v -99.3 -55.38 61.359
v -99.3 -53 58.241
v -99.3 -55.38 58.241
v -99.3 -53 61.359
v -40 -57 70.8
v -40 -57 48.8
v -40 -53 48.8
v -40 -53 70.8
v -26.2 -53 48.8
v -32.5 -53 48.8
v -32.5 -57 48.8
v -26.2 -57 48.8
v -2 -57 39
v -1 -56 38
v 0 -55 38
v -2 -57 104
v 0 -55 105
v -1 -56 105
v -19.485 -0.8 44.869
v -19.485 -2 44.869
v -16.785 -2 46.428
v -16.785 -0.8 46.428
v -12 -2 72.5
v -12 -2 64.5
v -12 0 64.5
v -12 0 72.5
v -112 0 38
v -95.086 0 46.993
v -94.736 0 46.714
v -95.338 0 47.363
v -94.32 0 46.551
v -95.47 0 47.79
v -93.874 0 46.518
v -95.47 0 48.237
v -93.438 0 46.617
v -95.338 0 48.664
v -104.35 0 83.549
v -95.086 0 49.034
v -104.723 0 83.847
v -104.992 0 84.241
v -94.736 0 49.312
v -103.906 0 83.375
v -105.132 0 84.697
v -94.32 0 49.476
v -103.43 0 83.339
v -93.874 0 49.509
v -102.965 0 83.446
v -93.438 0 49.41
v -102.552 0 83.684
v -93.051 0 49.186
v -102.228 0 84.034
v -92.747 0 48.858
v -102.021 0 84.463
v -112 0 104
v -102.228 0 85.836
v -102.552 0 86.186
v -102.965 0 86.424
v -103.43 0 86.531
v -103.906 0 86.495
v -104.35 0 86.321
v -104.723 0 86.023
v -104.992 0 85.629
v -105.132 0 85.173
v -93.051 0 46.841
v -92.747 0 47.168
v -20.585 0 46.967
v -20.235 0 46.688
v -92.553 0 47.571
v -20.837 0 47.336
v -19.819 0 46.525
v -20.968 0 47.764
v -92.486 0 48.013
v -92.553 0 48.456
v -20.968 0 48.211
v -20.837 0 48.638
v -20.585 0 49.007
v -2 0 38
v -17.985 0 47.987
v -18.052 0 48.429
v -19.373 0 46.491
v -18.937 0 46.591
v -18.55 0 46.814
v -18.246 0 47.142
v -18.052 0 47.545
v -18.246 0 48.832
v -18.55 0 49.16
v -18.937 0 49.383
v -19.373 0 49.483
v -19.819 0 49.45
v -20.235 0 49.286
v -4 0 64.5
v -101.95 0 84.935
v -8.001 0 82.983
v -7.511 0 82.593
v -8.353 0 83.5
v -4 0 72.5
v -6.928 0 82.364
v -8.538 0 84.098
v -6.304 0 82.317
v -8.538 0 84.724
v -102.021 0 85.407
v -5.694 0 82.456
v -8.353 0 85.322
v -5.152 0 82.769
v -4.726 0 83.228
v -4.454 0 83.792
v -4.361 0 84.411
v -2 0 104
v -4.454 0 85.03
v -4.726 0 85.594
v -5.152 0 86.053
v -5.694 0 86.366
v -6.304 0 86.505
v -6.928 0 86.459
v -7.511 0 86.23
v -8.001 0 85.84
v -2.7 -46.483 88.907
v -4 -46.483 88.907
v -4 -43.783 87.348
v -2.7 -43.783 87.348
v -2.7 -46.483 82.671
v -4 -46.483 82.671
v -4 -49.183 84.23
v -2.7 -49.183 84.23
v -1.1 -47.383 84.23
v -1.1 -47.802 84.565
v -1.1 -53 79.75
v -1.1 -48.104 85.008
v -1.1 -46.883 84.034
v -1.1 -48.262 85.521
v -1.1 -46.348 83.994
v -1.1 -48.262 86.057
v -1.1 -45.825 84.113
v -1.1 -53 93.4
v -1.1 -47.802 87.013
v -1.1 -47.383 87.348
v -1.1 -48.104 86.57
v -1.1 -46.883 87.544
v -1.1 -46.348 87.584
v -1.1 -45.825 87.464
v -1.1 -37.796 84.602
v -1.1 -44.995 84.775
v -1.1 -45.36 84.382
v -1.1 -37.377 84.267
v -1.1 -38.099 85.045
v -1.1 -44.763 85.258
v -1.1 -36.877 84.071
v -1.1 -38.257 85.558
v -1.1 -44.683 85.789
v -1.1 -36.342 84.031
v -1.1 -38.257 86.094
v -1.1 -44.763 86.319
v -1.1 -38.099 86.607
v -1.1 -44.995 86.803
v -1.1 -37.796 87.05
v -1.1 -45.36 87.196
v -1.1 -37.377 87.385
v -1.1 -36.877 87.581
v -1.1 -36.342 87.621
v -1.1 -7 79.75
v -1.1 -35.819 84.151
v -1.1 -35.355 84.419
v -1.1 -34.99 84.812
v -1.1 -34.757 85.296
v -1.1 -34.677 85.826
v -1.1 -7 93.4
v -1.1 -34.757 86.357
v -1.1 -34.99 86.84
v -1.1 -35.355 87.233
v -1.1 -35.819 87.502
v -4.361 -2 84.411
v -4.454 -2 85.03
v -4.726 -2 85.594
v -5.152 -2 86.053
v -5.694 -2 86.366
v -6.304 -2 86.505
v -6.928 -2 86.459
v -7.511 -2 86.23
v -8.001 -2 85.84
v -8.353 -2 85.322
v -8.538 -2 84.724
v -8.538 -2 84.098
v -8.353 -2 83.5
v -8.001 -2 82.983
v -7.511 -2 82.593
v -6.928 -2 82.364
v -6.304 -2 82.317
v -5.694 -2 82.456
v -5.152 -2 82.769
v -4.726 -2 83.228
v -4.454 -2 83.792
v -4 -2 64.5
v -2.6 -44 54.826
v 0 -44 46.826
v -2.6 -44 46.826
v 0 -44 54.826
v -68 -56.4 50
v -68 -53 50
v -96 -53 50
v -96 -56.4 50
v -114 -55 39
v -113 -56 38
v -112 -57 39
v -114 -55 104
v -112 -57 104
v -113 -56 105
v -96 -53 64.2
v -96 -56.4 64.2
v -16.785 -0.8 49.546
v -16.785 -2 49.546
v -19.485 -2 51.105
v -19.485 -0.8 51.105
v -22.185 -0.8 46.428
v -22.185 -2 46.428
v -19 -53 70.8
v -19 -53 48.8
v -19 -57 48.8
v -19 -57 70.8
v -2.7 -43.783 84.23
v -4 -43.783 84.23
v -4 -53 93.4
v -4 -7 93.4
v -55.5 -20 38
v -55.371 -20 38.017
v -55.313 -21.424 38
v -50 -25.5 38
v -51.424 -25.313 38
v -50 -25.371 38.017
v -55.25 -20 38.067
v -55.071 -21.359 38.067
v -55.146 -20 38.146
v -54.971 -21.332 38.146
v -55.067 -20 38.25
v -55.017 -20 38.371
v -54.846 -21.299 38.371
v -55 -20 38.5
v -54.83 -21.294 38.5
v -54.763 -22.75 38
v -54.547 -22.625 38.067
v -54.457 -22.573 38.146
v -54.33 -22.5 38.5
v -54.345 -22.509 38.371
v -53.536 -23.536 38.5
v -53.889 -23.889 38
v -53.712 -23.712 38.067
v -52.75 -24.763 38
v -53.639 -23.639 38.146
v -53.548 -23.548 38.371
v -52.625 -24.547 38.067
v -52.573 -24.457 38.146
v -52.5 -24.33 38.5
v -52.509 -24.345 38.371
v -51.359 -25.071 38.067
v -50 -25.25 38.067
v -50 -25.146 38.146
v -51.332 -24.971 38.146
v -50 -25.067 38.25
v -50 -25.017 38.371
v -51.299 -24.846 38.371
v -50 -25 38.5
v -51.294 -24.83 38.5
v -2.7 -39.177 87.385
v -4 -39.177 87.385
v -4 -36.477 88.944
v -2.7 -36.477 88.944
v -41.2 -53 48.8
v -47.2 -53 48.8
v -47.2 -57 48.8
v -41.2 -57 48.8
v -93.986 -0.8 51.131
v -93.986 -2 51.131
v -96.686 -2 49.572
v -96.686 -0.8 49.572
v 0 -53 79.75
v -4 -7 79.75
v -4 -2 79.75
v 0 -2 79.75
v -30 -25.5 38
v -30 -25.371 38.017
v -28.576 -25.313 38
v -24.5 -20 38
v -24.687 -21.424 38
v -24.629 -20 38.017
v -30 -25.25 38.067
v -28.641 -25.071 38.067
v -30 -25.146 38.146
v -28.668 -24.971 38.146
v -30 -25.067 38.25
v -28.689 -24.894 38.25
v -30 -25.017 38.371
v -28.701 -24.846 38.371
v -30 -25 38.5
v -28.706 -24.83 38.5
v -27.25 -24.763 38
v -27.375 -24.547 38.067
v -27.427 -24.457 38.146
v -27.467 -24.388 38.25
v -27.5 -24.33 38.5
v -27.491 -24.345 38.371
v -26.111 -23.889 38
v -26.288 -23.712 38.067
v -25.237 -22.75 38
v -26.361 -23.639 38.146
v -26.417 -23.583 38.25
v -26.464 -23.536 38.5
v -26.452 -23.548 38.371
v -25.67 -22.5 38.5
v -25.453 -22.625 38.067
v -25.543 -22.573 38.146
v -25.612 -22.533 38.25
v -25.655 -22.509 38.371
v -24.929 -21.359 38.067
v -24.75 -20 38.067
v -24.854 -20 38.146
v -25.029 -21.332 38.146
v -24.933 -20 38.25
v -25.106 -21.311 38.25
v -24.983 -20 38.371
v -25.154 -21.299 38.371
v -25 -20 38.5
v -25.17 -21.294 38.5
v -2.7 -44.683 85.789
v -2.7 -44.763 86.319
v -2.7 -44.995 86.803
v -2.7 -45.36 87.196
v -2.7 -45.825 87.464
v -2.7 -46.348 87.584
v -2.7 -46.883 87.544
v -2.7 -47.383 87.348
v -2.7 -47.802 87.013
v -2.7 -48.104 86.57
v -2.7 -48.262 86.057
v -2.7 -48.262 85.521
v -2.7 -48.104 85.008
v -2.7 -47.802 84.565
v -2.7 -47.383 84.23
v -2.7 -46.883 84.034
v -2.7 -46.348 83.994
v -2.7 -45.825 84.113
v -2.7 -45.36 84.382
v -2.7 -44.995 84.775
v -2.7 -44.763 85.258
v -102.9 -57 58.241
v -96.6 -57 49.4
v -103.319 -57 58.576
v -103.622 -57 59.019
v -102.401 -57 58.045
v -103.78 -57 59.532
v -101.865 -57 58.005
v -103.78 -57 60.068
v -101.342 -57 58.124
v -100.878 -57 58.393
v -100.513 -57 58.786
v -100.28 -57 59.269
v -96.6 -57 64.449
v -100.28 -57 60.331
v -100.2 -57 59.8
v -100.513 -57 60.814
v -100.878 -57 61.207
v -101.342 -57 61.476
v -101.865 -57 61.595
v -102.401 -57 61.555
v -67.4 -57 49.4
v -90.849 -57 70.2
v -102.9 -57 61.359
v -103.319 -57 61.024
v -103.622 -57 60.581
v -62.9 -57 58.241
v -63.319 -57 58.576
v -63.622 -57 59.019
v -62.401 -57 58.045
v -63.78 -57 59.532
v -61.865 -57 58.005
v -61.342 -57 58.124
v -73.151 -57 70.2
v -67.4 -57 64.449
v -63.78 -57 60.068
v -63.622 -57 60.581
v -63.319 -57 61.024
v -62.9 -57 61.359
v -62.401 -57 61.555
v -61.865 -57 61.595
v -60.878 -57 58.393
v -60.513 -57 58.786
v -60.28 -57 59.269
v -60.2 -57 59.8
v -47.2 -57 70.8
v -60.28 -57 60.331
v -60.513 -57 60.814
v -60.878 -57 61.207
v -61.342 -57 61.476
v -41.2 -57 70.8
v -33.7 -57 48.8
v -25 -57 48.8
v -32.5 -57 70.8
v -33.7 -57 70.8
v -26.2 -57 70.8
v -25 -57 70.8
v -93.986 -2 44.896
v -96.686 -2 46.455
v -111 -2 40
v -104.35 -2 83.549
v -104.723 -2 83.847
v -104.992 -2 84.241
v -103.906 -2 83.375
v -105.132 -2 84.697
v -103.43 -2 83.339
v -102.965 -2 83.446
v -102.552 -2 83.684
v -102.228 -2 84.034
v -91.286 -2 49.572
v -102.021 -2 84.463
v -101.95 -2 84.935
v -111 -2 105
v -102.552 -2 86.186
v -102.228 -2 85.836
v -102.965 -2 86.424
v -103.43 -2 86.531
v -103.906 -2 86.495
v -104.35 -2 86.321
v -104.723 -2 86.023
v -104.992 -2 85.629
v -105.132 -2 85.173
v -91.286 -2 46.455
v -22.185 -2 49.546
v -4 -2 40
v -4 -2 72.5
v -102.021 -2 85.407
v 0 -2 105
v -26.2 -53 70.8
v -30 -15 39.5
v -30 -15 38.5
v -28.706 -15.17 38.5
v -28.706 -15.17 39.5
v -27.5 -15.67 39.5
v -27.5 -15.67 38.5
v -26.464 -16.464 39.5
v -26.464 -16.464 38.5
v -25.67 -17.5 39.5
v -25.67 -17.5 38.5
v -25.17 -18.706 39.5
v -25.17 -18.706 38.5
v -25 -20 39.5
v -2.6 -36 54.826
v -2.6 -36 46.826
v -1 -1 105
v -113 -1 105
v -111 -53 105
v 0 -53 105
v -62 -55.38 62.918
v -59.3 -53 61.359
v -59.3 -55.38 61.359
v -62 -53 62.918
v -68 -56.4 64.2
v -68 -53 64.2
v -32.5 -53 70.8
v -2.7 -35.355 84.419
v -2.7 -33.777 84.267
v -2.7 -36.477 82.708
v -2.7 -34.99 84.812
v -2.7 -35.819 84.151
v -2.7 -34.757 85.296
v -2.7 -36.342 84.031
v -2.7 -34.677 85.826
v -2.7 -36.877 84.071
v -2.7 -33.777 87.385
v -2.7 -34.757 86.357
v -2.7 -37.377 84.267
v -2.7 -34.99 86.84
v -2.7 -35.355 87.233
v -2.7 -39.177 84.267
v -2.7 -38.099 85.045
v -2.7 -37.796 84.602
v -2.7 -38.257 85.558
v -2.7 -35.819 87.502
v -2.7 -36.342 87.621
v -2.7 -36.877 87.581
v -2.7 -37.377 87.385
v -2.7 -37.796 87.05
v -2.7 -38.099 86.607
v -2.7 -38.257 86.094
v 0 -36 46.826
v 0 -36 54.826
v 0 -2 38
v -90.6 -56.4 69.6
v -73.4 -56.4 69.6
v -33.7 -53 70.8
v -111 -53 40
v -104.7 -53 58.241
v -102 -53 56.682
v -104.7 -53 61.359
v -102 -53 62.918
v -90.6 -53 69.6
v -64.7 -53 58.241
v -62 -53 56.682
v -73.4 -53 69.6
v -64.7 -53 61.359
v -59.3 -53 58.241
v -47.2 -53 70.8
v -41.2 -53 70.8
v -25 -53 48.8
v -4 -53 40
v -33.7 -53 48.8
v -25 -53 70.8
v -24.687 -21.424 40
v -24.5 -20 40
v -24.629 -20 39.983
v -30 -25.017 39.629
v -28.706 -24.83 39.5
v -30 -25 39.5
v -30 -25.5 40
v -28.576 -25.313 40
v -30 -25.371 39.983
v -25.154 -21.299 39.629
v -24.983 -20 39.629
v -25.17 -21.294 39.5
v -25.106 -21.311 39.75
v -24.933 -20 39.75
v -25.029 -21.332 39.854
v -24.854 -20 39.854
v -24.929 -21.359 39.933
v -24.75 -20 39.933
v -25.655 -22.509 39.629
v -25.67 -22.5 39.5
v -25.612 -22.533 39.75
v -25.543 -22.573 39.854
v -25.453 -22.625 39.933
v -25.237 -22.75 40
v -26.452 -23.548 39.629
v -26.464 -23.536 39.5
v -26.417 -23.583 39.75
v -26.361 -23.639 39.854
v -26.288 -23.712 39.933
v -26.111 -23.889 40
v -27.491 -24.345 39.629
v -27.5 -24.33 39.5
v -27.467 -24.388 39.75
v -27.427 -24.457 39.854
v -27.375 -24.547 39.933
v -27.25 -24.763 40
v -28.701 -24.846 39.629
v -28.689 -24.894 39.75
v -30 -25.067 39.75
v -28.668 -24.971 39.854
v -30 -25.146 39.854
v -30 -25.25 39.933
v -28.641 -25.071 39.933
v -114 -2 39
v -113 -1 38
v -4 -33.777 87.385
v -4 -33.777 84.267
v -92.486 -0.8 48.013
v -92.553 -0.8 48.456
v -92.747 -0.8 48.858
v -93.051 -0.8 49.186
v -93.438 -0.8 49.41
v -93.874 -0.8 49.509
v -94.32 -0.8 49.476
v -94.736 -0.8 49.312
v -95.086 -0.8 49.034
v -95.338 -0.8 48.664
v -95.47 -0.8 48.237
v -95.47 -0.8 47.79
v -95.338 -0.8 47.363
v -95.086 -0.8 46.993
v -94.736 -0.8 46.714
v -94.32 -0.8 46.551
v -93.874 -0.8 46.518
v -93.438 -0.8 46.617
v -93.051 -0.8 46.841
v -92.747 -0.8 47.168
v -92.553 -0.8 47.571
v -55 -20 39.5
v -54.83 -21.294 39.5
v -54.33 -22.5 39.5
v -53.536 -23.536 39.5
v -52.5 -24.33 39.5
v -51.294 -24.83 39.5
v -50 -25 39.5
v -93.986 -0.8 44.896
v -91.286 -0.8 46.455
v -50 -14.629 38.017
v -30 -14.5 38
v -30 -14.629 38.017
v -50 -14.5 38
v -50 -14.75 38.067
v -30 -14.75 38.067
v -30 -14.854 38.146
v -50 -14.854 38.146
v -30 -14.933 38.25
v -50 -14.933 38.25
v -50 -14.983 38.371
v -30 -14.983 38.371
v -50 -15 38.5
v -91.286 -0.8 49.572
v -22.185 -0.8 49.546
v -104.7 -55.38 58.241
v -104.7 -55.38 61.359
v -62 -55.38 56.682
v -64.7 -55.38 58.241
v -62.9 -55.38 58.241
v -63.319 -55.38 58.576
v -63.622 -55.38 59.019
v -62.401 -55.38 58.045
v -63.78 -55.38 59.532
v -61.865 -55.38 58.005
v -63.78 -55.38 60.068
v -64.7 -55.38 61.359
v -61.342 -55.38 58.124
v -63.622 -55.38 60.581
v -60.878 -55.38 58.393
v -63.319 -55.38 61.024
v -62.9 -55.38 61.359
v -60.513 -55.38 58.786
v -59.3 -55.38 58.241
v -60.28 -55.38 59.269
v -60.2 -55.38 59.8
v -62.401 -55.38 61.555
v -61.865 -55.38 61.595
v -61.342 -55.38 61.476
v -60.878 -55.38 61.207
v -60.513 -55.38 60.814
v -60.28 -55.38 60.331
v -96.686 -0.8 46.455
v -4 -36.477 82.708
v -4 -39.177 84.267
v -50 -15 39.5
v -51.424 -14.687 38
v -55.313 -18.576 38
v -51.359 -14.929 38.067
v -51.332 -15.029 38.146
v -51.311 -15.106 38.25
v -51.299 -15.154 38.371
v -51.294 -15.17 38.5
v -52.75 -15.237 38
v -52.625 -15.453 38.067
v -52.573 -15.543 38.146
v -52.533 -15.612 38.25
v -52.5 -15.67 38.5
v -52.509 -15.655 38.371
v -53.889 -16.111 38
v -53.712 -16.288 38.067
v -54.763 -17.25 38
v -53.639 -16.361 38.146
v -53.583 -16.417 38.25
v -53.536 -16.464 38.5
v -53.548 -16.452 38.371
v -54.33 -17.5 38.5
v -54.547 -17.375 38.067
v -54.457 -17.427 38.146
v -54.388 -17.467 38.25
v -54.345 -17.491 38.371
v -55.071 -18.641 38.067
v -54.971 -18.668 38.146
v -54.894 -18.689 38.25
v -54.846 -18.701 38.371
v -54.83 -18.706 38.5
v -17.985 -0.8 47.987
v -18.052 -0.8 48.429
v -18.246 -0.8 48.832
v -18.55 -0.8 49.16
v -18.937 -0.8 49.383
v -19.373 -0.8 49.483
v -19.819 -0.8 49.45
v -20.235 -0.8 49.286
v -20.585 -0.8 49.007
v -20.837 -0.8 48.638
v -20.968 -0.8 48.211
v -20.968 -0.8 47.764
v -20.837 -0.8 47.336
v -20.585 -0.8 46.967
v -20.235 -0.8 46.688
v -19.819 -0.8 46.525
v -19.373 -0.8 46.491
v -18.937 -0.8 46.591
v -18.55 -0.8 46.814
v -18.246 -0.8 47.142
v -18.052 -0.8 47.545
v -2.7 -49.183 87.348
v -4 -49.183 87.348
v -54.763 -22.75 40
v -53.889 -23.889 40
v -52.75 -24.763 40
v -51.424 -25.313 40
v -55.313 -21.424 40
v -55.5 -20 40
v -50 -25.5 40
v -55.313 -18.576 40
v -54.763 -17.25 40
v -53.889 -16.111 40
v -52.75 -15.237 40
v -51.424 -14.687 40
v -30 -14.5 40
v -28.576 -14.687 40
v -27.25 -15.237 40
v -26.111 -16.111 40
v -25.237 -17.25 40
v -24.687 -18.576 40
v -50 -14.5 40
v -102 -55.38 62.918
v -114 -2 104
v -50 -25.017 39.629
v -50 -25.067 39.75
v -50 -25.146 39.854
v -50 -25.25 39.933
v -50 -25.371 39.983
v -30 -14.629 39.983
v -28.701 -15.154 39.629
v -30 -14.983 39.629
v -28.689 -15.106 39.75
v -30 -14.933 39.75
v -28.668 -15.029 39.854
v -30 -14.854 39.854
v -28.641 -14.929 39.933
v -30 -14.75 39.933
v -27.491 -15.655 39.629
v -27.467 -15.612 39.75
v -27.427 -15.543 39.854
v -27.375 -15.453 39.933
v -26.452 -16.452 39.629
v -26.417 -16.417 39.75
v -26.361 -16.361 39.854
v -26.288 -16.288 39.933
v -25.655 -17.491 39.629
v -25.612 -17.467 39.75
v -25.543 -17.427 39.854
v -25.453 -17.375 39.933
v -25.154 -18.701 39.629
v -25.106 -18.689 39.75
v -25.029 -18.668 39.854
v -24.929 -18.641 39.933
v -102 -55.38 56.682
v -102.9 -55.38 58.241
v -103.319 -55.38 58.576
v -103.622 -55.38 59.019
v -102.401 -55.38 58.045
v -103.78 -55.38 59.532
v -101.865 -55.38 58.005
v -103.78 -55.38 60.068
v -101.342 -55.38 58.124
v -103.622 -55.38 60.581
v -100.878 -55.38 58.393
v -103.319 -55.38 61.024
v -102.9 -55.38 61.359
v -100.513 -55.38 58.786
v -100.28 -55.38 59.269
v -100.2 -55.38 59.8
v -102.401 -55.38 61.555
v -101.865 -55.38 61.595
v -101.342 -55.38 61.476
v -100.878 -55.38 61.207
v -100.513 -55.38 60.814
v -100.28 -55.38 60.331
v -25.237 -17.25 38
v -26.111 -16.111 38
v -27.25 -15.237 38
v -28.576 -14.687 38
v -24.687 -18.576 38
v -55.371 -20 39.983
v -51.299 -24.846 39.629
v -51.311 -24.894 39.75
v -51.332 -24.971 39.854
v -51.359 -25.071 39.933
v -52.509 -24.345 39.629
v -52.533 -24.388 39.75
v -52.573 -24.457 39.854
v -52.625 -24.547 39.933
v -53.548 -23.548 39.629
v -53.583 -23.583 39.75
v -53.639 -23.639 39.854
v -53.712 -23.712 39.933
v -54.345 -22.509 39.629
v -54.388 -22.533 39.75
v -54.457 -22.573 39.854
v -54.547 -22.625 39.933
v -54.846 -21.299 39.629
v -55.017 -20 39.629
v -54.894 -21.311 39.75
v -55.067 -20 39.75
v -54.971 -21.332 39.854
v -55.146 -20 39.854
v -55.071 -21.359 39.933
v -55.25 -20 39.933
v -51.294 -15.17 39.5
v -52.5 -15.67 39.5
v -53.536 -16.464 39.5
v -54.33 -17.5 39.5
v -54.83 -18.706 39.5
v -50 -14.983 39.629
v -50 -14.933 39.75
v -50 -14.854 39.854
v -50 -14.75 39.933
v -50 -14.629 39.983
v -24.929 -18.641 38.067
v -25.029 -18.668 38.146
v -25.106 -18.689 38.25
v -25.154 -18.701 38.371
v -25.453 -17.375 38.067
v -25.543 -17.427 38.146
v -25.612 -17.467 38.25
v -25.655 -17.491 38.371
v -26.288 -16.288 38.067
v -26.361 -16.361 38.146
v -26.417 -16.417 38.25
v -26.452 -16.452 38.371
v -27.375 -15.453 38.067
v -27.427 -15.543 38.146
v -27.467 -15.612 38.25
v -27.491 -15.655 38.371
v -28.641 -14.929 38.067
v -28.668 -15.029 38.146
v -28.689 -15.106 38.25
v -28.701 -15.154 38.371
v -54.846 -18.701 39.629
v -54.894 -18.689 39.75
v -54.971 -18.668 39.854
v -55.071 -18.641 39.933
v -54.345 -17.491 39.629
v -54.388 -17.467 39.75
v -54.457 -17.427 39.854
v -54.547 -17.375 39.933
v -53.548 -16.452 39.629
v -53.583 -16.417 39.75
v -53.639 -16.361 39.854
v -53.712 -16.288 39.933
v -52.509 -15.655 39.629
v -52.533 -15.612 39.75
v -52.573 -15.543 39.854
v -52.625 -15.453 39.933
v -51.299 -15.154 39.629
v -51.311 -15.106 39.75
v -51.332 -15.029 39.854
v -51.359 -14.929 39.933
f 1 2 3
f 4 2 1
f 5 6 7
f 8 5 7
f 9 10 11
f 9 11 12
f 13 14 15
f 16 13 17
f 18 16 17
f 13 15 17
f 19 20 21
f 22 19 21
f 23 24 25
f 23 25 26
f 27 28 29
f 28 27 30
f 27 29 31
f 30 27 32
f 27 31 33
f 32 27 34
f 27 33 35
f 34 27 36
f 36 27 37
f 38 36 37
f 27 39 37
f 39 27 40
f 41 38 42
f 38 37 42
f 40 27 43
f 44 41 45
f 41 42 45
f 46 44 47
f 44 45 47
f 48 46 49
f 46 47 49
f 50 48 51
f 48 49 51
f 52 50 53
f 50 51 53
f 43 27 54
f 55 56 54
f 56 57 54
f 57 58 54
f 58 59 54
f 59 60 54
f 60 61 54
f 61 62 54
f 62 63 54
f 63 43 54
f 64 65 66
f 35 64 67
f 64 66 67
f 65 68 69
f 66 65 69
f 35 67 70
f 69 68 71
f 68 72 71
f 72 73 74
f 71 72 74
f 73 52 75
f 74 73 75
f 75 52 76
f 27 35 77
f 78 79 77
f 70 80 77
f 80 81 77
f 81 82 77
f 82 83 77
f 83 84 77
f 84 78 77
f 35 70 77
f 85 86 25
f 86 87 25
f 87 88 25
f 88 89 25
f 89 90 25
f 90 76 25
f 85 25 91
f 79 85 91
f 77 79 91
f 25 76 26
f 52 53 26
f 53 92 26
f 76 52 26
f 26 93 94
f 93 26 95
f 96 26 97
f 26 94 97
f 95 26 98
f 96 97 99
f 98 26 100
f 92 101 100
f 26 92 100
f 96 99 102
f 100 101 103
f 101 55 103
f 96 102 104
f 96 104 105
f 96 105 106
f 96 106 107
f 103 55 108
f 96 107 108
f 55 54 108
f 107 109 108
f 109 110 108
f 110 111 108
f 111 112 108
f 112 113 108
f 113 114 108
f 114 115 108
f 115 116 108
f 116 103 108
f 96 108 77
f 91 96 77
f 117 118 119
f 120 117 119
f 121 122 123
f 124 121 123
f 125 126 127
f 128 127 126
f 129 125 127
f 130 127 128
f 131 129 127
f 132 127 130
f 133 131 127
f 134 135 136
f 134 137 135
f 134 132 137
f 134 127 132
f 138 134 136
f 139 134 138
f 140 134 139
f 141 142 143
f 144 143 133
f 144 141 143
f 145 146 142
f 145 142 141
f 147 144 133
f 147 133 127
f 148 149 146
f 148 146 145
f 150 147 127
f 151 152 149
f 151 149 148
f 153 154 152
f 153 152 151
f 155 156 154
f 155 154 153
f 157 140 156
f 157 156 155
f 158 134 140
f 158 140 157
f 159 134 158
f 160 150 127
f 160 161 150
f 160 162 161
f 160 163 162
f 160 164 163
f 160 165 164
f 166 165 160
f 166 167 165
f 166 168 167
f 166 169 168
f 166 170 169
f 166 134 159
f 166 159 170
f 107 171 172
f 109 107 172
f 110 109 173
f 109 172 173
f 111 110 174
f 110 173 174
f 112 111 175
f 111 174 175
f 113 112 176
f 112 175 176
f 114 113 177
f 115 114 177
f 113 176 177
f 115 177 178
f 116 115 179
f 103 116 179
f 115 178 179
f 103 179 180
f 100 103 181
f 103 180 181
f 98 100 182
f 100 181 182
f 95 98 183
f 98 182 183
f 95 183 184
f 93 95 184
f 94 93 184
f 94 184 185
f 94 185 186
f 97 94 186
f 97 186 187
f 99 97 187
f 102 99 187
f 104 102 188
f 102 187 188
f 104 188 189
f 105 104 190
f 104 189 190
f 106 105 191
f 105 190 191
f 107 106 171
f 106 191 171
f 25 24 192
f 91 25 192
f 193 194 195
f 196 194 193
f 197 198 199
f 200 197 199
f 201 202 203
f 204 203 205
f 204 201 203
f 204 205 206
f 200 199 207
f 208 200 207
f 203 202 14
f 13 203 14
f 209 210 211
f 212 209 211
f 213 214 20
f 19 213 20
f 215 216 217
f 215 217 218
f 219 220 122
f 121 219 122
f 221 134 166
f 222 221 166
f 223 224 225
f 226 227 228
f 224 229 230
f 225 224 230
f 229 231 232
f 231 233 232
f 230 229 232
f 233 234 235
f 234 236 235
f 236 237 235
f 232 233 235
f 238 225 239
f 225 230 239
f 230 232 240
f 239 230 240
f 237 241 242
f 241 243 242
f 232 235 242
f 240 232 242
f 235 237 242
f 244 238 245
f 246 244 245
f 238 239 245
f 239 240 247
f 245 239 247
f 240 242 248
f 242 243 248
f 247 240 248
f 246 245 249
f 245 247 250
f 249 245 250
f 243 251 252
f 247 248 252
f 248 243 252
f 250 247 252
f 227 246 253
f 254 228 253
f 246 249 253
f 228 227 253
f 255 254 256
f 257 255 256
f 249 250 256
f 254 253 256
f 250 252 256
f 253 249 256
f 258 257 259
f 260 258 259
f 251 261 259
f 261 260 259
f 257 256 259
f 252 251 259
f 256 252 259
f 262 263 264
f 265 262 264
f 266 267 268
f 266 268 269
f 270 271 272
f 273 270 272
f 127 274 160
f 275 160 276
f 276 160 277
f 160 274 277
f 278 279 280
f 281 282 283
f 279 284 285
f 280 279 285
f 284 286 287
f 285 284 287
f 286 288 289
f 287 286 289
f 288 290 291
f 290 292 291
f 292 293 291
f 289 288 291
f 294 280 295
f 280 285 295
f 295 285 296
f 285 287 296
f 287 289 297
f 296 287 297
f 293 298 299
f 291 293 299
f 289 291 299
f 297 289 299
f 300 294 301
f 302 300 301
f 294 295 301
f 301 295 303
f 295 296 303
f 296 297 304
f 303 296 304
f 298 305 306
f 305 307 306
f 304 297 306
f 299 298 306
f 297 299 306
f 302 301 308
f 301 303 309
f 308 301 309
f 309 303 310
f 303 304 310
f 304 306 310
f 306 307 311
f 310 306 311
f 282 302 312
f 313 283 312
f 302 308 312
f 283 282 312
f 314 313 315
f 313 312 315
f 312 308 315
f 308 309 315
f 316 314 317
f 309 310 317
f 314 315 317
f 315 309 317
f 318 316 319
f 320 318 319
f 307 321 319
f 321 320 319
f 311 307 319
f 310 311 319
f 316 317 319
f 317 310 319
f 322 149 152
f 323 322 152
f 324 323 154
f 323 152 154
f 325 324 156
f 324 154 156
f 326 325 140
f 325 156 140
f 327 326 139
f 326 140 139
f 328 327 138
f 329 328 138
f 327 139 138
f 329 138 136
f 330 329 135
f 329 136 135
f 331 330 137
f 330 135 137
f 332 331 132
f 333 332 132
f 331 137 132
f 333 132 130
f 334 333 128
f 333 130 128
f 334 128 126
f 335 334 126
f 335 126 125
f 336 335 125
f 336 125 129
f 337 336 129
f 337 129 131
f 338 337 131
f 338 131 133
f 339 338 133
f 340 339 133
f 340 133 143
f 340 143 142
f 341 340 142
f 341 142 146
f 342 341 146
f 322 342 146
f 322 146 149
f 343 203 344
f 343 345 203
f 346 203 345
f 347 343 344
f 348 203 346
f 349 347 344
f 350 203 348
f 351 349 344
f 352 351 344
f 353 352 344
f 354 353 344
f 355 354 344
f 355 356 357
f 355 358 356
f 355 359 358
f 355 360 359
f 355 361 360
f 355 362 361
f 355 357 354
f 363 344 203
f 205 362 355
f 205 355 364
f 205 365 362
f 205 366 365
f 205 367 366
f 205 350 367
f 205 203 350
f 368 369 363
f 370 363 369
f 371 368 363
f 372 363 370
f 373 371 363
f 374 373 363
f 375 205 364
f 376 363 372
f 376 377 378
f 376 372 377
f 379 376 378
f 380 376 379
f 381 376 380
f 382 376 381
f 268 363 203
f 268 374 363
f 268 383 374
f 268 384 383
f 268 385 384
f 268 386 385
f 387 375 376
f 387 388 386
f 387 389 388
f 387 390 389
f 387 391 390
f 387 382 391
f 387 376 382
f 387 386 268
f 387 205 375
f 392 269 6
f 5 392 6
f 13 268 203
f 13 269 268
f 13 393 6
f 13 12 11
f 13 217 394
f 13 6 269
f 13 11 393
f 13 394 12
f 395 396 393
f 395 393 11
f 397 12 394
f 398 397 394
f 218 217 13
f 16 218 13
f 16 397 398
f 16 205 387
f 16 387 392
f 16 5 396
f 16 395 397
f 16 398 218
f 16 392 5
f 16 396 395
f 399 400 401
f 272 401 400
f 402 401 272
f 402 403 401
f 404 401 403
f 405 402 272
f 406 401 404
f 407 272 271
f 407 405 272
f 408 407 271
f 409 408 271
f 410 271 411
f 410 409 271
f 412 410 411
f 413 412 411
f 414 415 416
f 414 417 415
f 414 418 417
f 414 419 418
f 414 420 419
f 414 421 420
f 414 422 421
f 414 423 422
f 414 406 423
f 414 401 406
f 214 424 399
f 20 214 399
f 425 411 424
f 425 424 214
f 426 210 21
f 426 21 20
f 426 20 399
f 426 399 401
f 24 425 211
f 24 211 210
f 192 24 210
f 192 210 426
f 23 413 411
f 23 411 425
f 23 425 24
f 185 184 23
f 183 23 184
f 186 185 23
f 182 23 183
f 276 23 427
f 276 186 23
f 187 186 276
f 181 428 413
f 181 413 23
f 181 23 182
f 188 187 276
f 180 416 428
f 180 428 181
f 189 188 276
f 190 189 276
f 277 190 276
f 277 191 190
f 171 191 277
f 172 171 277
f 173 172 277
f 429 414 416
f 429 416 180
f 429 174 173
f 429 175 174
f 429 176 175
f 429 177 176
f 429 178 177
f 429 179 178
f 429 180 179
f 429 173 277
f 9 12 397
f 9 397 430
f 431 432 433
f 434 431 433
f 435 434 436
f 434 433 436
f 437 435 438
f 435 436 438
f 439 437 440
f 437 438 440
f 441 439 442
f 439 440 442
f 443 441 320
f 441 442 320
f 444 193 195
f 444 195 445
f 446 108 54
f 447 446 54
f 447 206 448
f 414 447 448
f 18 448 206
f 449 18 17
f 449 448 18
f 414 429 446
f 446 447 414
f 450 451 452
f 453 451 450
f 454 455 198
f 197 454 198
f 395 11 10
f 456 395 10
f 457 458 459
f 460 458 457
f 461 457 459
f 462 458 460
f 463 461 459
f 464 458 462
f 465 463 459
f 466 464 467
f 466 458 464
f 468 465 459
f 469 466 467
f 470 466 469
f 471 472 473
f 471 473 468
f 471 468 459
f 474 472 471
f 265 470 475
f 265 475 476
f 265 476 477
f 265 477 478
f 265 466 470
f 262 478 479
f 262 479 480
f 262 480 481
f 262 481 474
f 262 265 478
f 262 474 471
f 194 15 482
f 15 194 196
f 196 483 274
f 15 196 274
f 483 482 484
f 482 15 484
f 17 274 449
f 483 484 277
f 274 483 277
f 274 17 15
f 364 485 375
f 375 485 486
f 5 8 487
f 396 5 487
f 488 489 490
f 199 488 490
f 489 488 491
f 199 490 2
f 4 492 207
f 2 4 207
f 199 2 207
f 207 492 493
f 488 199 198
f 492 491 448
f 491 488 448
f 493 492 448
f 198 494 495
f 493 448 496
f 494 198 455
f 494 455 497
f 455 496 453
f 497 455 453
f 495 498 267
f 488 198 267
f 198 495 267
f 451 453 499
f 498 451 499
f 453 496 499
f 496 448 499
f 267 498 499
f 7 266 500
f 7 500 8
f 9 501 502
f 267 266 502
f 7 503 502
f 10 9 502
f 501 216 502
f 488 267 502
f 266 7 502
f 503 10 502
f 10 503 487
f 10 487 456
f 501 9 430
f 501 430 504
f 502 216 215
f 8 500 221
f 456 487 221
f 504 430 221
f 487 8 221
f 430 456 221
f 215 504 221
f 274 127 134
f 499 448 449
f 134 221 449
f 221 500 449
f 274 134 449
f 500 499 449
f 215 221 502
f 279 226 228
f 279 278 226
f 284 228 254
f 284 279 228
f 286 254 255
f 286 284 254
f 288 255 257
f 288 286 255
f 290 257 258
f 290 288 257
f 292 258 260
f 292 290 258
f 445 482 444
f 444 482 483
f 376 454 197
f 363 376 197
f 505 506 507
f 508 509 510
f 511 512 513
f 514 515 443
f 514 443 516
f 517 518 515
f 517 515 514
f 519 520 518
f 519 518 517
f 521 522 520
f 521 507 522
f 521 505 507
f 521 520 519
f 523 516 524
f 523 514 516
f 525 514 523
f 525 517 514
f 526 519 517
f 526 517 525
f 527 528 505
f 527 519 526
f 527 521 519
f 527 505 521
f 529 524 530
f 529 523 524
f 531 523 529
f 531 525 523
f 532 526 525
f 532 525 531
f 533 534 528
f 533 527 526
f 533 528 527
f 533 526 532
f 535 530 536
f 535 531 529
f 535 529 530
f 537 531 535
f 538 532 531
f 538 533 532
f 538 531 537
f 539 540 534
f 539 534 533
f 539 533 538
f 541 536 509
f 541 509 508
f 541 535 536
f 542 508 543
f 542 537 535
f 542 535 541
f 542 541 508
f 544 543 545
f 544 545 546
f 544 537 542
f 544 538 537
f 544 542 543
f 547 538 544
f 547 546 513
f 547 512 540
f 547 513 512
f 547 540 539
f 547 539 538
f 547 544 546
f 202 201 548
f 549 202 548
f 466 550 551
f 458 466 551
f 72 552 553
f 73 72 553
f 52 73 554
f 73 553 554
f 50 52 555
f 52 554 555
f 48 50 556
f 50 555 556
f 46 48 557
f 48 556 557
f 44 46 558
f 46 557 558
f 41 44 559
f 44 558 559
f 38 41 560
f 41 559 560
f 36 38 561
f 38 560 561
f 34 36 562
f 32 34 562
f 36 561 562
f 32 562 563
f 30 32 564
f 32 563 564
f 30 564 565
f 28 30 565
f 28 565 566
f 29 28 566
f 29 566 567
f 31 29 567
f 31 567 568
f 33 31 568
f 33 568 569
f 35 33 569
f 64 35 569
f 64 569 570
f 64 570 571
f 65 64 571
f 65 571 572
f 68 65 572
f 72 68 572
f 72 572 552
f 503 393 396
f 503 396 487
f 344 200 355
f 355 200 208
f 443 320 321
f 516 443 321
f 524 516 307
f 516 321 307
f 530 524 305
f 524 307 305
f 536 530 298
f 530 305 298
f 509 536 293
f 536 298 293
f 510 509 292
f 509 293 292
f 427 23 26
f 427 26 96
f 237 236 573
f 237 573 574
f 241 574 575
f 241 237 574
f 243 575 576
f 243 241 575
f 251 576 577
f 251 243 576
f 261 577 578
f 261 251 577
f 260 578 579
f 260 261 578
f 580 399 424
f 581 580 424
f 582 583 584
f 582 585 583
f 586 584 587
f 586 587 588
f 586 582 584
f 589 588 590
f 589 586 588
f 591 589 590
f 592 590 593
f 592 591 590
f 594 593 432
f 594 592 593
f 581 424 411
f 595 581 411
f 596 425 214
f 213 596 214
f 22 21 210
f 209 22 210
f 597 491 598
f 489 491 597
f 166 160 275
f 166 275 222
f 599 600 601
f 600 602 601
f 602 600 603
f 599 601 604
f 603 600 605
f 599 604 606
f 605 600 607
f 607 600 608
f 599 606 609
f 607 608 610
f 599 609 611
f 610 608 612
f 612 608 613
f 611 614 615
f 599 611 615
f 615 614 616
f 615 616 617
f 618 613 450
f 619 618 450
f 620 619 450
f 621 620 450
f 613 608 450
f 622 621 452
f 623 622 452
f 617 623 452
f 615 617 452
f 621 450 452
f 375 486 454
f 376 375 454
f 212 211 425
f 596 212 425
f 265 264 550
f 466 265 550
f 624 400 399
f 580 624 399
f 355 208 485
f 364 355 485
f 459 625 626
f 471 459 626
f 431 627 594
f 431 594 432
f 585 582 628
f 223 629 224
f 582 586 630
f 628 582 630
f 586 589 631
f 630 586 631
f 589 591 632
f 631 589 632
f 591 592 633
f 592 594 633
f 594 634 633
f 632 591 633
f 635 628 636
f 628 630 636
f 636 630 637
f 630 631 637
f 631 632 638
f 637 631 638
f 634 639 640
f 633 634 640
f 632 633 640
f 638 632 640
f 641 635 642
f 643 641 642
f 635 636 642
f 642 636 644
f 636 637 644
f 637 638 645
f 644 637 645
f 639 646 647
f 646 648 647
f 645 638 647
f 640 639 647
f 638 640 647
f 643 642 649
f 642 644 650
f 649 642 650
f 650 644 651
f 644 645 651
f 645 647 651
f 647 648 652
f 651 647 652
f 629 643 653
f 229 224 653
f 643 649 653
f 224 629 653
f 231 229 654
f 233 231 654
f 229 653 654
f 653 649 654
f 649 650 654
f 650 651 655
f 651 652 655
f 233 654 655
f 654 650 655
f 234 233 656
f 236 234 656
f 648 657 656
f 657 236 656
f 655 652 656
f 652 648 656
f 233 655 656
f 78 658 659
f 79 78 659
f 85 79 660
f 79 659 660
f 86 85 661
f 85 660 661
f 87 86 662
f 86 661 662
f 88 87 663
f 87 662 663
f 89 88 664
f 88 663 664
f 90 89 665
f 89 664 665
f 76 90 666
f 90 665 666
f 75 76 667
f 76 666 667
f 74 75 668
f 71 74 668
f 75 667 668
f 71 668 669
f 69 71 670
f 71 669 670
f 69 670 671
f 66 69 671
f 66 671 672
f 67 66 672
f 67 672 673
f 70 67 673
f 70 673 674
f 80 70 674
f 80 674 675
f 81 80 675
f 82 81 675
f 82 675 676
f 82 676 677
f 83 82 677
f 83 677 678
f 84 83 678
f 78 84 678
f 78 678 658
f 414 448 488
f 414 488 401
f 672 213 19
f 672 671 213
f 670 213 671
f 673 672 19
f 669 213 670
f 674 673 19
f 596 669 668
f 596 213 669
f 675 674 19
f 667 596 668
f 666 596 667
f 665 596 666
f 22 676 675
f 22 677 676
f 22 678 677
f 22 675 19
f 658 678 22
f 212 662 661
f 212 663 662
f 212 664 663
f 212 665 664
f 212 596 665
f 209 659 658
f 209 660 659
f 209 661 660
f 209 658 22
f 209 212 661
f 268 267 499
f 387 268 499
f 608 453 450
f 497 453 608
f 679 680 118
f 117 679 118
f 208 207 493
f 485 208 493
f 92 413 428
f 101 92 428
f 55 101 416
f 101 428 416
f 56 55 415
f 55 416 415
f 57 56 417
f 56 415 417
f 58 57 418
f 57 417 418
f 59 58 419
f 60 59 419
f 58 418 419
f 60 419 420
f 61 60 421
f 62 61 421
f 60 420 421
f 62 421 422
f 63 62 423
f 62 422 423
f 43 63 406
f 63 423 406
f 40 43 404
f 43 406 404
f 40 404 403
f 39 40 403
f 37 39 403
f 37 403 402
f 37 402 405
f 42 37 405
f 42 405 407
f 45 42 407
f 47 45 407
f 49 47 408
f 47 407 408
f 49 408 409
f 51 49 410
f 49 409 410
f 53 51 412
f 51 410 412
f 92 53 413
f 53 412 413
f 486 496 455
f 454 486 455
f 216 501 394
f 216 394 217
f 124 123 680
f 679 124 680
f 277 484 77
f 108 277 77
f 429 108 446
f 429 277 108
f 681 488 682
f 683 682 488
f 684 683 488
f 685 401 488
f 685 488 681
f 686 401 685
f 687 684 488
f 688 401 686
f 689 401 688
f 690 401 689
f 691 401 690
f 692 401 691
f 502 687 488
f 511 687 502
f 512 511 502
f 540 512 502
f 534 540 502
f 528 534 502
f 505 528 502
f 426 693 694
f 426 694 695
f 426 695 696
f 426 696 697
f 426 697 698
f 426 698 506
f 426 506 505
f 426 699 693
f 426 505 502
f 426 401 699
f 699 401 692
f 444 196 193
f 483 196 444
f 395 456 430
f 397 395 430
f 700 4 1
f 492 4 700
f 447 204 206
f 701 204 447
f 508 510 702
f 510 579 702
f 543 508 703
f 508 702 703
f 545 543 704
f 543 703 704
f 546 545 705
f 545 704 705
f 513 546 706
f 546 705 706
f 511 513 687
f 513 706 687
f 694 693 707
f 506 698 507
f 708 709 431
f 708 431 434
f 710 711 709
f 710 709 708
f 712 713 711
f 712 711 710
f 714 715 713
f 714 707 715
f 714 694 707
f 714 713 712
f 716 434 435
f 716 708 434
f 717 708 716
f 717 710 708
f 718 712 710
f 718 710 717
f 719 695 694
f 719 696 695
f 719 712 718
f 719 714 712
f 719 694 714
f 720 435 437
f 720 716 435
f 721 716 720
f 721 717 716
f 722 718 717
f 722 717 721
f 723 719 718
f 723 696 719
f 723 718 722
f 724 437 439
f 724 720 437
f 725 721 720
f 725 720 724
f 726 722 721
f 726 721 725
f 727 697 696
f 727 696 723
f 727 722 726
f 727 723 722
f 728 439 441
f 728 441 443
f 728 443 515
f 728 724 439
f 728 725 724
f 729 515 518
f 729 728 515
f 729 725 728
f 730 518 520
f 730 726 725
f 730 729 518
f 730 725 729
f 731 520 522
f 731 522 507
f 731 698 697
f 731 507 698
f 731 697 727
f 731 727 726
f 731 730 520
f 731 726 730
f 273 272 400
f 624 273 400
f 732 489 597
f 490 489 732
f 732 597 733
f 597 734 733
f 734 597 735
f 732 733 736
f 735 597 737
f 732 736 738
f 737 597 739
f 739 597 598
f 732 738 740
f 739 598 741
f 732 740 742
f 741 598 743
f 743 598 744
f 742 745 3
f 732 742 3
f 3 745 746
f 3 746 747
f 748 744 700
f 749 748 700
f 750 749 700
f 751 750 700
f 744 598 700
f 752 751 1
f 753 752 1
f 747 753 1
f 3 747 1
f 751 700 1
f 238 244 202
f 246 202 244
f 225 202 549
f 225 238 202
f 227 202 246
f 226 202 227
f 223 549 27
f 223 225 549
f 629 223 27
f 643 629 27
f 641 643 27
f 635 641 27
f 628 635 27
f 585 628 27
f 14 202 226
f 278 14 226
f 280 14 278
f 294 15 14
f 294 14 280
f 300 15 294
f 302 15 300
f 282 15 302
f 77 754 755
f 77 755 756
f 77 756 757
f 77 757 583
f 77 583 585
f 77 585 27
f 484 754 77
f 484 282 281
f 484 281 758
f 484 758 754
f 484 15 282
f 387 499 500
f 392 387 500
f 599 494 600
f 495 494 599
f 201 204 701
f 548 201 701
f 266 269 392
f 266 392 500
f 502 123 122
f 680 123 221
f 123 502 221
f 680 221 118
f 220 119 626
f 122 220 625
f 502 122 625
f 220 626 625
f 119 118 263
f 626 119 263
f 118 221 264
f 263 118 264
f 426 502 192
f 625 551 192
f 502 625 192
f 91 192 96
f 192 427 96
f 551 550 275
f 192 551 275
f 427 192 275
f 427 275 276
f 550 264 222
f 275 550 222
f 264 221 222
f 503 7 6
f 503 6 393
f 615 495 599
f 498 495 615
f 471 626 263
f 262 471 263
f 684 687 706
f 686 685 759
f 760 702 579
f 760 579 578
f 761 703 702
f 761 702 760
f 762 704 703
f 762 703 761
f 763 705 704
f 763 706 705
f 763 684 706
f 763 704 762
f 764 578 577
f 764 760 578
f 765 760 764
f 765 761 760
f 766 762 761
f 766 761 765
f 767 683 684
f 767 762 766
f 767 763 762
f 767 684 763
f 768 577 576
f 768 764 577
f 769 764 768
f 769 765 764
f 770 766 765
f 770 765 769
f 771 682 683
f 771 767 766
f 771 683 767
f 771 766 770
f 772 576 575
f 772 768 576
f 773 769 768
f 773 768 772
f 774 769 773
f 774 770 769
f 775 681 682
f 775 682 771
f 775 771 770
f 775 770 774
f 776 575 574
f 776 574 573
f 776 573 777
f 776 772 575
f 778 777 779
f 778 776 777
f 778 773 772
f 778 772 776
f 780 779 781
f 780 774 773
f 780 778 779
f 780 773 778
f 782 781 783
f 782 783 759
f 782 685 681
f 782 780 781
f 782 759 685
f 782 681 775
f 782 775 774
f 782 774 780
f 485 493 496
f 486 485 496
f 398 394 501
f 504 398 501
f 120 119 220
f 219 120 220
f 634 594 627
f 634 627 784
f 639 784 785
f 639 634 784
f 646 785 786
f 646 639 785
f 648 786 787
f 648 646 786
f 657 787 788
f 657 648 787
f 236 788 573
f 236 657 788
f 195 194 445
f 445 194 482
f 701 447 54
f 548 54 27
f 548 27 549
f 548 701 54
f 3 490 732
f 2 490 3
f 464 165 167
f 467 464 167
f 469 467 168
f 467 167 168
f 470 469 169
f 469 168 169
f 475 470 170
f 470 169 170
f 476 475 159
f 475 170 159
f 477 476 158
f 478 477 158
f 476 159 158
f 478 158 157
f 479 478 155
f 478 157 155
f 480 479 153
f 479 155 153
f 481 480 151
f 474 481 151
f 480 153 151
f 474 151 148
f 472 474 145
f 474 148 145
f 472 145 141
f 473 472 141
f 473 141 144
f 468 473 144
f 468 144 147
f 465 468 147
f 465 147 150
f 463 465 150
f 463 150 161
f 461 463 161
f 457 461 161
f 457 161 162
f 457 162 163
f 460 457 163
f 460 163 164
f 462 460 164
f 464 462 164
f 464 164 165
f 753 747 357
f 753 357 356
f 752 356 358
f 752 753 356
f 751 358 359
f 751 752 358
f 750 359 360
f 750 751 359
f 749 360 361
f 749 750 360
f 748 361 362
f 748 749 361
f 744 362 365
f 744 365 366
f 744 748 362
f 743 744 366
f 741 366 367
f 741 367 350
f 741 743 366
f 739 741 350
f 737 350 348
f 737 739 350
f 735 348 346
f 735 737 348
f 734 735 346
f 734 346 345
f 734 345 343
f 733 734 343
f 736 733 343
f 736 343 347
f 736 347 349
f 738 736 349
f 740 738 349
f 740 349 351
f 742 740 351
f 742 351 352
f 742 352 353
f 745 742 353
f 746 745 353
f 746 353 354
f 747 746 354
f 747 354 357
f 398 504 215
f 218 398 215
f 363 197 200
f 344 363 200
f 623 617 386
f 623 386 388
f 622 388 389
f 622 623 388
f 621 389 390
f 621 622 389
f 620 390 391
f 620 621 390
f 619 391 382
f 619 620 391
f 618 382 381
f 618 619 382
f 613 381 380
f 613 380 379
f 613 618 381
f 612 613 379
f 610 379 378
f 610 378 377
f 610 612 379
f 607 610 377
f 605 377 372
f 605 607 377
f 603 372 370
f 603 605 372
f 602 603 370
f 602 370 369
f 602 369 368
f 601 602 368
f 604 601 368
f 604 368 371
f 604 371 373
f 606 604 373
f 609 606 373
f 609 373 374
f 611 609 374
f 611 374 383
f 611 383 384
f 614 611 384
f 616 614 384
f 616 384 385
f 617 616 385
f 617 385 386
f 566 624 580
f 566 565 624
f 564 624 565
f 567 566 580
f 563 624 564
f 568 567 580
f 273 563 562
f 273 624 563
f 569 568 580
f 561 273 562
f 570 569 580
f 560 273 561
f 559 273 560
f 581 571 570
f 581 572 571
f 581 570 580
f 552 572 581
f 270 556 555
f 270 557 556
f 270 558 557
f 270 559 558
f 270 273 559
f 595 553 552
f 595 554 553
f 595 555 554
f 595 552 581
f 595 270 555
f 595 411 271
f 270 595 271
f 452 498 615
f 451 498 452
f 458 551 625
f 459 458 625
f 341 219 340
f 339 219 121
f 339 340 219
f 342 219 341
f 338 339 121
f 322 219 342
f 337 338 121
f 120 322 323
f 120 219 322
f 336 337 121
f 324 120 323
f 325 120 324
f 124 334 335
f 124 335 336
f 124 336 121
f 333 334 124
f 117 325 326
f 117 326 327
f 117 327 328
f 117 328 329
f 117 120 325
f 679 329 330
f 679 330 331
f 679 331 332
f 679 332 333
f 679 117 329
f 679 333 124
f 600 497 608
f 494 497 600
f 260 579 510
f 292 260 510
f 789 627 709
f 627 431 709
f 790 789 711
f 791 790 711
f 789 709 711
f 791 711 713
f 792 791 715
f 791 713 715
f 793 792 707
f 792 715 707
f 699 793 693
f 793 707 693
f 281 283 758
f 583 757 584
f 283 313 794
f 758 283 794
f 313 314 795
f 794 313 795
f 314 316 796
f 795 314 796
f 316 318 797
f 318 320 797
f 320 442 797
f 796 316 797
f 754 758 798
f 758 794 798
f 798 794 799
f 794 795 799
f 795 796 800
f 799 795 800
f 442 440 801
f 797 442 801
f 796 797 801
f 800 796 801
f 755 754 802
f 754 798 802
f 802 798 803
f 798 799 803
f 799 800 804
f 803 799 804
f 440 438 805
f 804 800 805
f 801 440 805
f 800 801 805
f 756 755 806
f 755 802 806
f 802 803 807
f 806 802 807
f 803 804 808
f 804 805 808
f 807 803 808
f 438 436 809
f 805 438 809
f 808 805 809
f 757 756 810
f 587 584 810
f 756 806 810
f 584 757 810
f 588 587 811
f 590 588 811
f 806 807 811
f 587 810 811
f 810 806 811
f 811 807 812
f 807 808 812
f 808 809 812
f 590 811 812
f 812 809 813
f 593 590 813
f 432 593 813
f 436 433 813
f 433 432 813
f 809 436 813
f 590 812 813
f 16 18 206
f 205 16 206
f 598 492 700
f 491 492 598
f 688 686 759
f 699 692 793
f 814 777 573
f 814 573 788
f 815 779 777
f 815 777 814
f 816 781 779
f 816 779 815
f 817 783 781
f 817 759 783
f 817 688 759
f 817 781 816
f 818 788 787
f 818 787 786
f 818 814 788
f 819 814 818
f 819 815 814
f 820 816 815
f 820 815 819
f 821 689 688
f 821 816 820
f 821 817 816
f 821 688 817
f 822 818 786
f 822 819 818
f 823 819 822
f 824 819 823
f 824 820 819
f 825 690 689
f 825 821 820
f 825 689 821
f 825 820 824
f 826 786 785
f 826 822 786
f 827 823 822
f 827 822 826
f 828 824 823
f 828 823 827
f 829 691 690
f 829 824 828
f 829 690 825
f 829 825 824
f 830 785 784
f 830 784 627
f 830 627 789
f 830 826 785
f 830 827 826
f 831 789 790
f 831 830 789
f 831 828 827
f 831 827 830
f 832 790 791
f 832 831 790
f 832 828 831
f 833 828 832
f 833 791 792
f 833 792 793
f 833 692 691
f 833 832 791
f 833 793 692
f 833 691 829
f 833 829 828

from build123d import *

# Parameters (mm, degrees)
F7_W      = 57
F7_H      = 65
F8_DEPTH  = 3
F6_W      = 114
F6_H      = 57
F6_W_2    = 30
F6_H_2    = 10
F9_DEPTH  = 2
F10_R     = 4.99999
F5_W      = 57
F5_H      = 53.4
F5_R      = 1.8
F11_DEPTH = 4
F12_W     = 51
F12_H     = 25.25
F13_DEPTH = 1.1
F14_DEPTH = 4
F15_W     = 5
F15_H     = 25.25
F16_DEPTH = 4.1
F1_W      = 111
F1_H      = 65
F1_R      = 1.5
F1_W_2    = 8
F1_H_2    = 8
F1_R_2    = 1.6
F1_R_3    = 2.1
F17_DEPTH = 2
F19_SIZE  = 2
F20_SIZE  = 2
F18_W     = 111
F18_H     = 65
F18_R     = 1.8
F18_W_2   = 28.2
F18_H_2   = 22
F21_DEPTH = 4
F22_SIZE  = 2
F23_SIZE  = 2
F24_SIZE  = 0.99999
F25_SIZE  = 0.99999
F26_R     = 0.5
F27_W     = 1.2
F27_H     = 4
F28_DEPTH = 22
F29_SIZE  = 0.6
F31_DEPTH = 1.3
F33_DEPTH = 2.38
F35_DEPTH = 1.2
F36_W     = 8
F36_H     = 8
F37_DEPTH = 2.6


# Not quite as in the source:
# - a fillet or chamfer is up to 0.001 mm smaller than in the source, because OpenCascade refuses the exact size


with BuildPart() as f8:
    # F7 (on offset) → F8 (new body)
    with BuildSketch(Plane.YZ.offset(-111)):
        with Locations((-28.5, 72.5)):
            Rectangle(F7_W, F7_H)
    extrude(amount=-F8_DEPTH)

    # F6 (on offset) → F9 (join)
    with BuildSketch(Plane.XY.offset(40)):
        with Locations((-57, -28.5)):
            Rectangle(F6_W, F6_H)
        with Locations((-40, -20)):
            Rectangle(F6_W_2, F6_H_2, mode=Mode.SUBTRACT)
    extrude(amount=-F9_DEPTH)

    # F10 (radius 5 in the source; OpenCascade refuses exactly that, so slightly less here)
    f10_edges = [f8.edges().sort_by_distance(p)[0] for p in [
        (-25, -25, 39),
        (-55, -25, 39),
        (-55, -15, 39),
        (-25, -15, 39),
    ]]
    fillet(f10_edges, radius=F10_R)

    # F5 (on Right) → F11 (join)
    with BuildSketch(Plane.YZ):
        with Locations((-28.5, 66.7)):
            Rectangle(F5_W, F5_H)
        with Locations((-46.4825592935, 85.7889130712)):
            Circle(F5_R, mode=Mode.SUBTRACT)
        with Locations((-36.4768356085, 85.8261138201)):
            Circle(F5_R, mode=Mode.SUBTRACT)
    extrude(amount=-F11_DEPTH)

    # F12 (on face) → F13 (cut)
    with BuildSketch(Plane.YZ):
        with Locations((-27.5, 92.375)):
            Rectangle(F12_W, F12_H)
    extrude(amount=-F13_DEPTH, mode=Mode.SUBTRACT)

    # F14 (add): a face of the model
    f14_faces = [f8.faces().sort_by_distance(p)[0] for p in [
        (0, -28.7827981232, 59.796589178),
    ]]
    extrude(f14_faces, amount=-F14_DEPTH)

    # F15 (on face) → F16 (cut)
    with BuildSketch(Plane.YZ):
        with Locations((-4.5, 92.375)):
            Rectangle(F15_W, F15_H)
    extrude(amount=-F16_DEPTH, mode=Mode.SUBTRACT)

    # F1 (on offset) → F17 (join)
    with BuildSketch(Plane.XZ.offset(2)):
        with Locations((-55.5, 72.5)):
            Rectangle(F1_W, F1_H)
        with Locations((-93.9863845706, 48.0133742094)):
            Circle(F1_R, mode=Mode.SUBTRACT)
        with Locations((-19.4850880653, 47.9871667922)):
            Circle(F1_R, mode=Mode.SUBTRACT)
        with Locations((-7.9999973103, 68.4999966025)):
            Rectangle(F1_W_2, F1_H_2, mode=Mode.SUBTRACT)
        with Locations((-103.55, 84.9350020289)):
            Circle(F1_R_2, mode=Mode.SUBTRACT)
        with Locations((-6.4611095004, 84.4112932682)):
            Circle(F1_R_3, mode=Mode.SUBTRACT)
    extrude(amount=-F17_DEPTH)

    # F19
    f19_edges = [f8.edges().sort_by_distance(p)[0] for p in [
        (0, 0, 71.5),
    ]]
    chamfer(f19_edges, length=F19_SIZE)

    # F20
    f20_edges = [f8.edges().sort_by_distance(p)[0] for p in [
        (-114, 0, 71.5),
    ]]
    chamfer(f20_edges, length=F20_SIZE)

    # F18 (on offset) → F21 (join)
    with BuildSketch(Plane.XZ.offset(53)):
        with Locations((-55.5, 72.5)):
            Rectangle(F18_W, F18_H)
        with Locations((-102, 59.8)):
            Circle(F18_R, mode=Mode.SUBTRACT)
        Polygon((-96, 64.2), (-90.6, 69.6), (-73.4, 69.6), (-68, 64.2), (-68, 50), (-96, 50), align=None, mode=Mode.SUBTRACT)
        with Locations((-62, 59.8)):
            Circle(F18_R, mode=Mode.SUBTRACT)
        with Locations((-33.1, 59.8)):
            Rectangle(F18_W_2, F18_H_2, mode=Mode.SUBTRACT)
    extrude(amount=F21_DEPTH)

    # F22
    f22_edges = [f8.edges().sort_by_distance(p)[0] for p in [
        (0, -57, 71.5),
    ]]
    chamfer(f22_edges, length=F22_SIZE)

    # F23
    f23_edges = [f8.edges().sort_by_distance(p)[0] for p in [
        (-114, -57, 71.5),
    ]]
    chamfer(f23_edges, length=F23_SIZE)

    # F24 (size 1 in the source; OpenCascade refuses exactly that, so slightly less here)
    f24_edges = [f8.edges().sort_by_distance(p)[0] for p in [
        (-57, -57, 105),
        (-57, 0, 105),
        (-114, -28.5, 105),
    ]]
    chamfer(f24_edges, length=F24_SIZE)

    # F25 (size 1 in the source; OpenCascade refuses exactly that, so slightly less here)
    f25_edges = [f8.edges().sort_by_distance(p)[0] for p in [
        (-57, -57, 38),
        (-114, -28.5, 38),
    ]]
    chamfer(f25_edges, length=F25_SIZE)

    # F26
    f26_edges = [f8.edges().sort_by_distance(p)[0] for p in [
        (-40, -25, 38),
        (-53.535537, -23.535537, 38),
        (-40, -15, 38),
        (-26.464463, -16.464463, 38),
        (-26.464463, -16.464463, 40),
        (-53.535537, -23.535537, 40),
    ]]
    fillet(f26_edges, radius=F26_R)

    # F27 (on face) → F28 (join, through all)
    with BuildSketch(Plane.XY.offset(48.8)):
        with Locations((-33.1, -55)):
            Rectangle(F27_W, F27_H)
        with Locations((-40.6, -55)):
            Rectangle(F27_W, F27_H)
        with Locations((-25.6, -55)):
            Rectangle(F27_W, F27_H)
    extrude(amount=F28_DEPTH)

    # F29
    f29_edges = [f8.edges().sort_by_distance(p)[0] for p in [
        (-82, -57, 50),
        (-68, -57, 57.1),
        (-70.7, -57, 66.9),
        (-82, -57, 69.6),
        (-93.3, -57, 66.9),
        (-96, -57, 57.1),
    ]]
    chamfer(f29_edges, length=F29_SIZE)

    # F30 (on face) → F31 (cut)
    with BuildSketch(Plane(origin=(-4, 0, 0), x_dir=(0, -1, 0), z_dir=(-1, 0, 0))):
        Polygon((39.1768356085, 84.2672680933), (39.1768356085, 87.3849595469), (36.4768356085, 88.9438052737), (33.7768356085, 87.3849595469), (33.7768356085, 84.2672680933), (36.4768356085, 82.7084223665), align=None)
        Polygon((49.1825592935, 84.2300673443), (49.1825592935, 87.347758798), (46.4825592935, 88.9066045248), (43.7825592935, 87.347758798), (43.7825592935, 84.2300673443), (46.4825592935, 82.6712216175), align=None)
    extrude(amount=-F31_DEPTH, mode=Mode.SUBTRACT)

    # F32 (on face) → F33 (cut)
    with BuildSketch(Plane.XZ.offset(53)):
        Polygon((-64.7, 61.3588457268), (-64.7, 58.2411542732), (-62, 56.6823085464), (-59.3, 58.2411542732), (-59.3, 61.3588457268), (-62, 62.9176914536), align=None)
        Polygon((-104.7, 61.3588457268), (-104.7, 58.2411542732), (-102, 56.6823085464), (-99.3, 58.2411542732), (-99.3, 61.3588457268), (-102, 62.9176914536), align=None)
    extrude(amount=F33_DEPTH, mode=Mode.SUBTRACT)

    # F34 (on face) → F35 (cut)
    with BuildSketch(Plane.XZ.offset(2)):
        Polygon((-91.2863845706, 46.4545284826), (-91.2863845706, 49.5722199362), (-93.9863845706, 51.131065663), (-96.6863845706, 49.5722199362), (-96.6863845706, 46.4545284826), (-93.9863845706, 44.8956827558), align=None)
        Polygon((-16.7850880653, 46.4283210653), (-16.7850880653, 49.546012519), (-19.4850880653, 51.1048582458), (-22.1850880653, 49.546012519), (-22.1850880653, 46.4283210653), (-19.4850880653, 44.8694753385), align=None)
    extrude(amount=-F35_DEPTH, mode=Mode.SUBTRACT)

    # F36 (on face) → F37 (cut)
    with BuildSketch(Plane.YZ):
        with Locations((-40, 50.8261138201)):
            Rectangle(F36_W, F36_H)
    extrude(amount=-F37_DEPTH, mode=Mode.SUBTRACT)


solid = f8.part
